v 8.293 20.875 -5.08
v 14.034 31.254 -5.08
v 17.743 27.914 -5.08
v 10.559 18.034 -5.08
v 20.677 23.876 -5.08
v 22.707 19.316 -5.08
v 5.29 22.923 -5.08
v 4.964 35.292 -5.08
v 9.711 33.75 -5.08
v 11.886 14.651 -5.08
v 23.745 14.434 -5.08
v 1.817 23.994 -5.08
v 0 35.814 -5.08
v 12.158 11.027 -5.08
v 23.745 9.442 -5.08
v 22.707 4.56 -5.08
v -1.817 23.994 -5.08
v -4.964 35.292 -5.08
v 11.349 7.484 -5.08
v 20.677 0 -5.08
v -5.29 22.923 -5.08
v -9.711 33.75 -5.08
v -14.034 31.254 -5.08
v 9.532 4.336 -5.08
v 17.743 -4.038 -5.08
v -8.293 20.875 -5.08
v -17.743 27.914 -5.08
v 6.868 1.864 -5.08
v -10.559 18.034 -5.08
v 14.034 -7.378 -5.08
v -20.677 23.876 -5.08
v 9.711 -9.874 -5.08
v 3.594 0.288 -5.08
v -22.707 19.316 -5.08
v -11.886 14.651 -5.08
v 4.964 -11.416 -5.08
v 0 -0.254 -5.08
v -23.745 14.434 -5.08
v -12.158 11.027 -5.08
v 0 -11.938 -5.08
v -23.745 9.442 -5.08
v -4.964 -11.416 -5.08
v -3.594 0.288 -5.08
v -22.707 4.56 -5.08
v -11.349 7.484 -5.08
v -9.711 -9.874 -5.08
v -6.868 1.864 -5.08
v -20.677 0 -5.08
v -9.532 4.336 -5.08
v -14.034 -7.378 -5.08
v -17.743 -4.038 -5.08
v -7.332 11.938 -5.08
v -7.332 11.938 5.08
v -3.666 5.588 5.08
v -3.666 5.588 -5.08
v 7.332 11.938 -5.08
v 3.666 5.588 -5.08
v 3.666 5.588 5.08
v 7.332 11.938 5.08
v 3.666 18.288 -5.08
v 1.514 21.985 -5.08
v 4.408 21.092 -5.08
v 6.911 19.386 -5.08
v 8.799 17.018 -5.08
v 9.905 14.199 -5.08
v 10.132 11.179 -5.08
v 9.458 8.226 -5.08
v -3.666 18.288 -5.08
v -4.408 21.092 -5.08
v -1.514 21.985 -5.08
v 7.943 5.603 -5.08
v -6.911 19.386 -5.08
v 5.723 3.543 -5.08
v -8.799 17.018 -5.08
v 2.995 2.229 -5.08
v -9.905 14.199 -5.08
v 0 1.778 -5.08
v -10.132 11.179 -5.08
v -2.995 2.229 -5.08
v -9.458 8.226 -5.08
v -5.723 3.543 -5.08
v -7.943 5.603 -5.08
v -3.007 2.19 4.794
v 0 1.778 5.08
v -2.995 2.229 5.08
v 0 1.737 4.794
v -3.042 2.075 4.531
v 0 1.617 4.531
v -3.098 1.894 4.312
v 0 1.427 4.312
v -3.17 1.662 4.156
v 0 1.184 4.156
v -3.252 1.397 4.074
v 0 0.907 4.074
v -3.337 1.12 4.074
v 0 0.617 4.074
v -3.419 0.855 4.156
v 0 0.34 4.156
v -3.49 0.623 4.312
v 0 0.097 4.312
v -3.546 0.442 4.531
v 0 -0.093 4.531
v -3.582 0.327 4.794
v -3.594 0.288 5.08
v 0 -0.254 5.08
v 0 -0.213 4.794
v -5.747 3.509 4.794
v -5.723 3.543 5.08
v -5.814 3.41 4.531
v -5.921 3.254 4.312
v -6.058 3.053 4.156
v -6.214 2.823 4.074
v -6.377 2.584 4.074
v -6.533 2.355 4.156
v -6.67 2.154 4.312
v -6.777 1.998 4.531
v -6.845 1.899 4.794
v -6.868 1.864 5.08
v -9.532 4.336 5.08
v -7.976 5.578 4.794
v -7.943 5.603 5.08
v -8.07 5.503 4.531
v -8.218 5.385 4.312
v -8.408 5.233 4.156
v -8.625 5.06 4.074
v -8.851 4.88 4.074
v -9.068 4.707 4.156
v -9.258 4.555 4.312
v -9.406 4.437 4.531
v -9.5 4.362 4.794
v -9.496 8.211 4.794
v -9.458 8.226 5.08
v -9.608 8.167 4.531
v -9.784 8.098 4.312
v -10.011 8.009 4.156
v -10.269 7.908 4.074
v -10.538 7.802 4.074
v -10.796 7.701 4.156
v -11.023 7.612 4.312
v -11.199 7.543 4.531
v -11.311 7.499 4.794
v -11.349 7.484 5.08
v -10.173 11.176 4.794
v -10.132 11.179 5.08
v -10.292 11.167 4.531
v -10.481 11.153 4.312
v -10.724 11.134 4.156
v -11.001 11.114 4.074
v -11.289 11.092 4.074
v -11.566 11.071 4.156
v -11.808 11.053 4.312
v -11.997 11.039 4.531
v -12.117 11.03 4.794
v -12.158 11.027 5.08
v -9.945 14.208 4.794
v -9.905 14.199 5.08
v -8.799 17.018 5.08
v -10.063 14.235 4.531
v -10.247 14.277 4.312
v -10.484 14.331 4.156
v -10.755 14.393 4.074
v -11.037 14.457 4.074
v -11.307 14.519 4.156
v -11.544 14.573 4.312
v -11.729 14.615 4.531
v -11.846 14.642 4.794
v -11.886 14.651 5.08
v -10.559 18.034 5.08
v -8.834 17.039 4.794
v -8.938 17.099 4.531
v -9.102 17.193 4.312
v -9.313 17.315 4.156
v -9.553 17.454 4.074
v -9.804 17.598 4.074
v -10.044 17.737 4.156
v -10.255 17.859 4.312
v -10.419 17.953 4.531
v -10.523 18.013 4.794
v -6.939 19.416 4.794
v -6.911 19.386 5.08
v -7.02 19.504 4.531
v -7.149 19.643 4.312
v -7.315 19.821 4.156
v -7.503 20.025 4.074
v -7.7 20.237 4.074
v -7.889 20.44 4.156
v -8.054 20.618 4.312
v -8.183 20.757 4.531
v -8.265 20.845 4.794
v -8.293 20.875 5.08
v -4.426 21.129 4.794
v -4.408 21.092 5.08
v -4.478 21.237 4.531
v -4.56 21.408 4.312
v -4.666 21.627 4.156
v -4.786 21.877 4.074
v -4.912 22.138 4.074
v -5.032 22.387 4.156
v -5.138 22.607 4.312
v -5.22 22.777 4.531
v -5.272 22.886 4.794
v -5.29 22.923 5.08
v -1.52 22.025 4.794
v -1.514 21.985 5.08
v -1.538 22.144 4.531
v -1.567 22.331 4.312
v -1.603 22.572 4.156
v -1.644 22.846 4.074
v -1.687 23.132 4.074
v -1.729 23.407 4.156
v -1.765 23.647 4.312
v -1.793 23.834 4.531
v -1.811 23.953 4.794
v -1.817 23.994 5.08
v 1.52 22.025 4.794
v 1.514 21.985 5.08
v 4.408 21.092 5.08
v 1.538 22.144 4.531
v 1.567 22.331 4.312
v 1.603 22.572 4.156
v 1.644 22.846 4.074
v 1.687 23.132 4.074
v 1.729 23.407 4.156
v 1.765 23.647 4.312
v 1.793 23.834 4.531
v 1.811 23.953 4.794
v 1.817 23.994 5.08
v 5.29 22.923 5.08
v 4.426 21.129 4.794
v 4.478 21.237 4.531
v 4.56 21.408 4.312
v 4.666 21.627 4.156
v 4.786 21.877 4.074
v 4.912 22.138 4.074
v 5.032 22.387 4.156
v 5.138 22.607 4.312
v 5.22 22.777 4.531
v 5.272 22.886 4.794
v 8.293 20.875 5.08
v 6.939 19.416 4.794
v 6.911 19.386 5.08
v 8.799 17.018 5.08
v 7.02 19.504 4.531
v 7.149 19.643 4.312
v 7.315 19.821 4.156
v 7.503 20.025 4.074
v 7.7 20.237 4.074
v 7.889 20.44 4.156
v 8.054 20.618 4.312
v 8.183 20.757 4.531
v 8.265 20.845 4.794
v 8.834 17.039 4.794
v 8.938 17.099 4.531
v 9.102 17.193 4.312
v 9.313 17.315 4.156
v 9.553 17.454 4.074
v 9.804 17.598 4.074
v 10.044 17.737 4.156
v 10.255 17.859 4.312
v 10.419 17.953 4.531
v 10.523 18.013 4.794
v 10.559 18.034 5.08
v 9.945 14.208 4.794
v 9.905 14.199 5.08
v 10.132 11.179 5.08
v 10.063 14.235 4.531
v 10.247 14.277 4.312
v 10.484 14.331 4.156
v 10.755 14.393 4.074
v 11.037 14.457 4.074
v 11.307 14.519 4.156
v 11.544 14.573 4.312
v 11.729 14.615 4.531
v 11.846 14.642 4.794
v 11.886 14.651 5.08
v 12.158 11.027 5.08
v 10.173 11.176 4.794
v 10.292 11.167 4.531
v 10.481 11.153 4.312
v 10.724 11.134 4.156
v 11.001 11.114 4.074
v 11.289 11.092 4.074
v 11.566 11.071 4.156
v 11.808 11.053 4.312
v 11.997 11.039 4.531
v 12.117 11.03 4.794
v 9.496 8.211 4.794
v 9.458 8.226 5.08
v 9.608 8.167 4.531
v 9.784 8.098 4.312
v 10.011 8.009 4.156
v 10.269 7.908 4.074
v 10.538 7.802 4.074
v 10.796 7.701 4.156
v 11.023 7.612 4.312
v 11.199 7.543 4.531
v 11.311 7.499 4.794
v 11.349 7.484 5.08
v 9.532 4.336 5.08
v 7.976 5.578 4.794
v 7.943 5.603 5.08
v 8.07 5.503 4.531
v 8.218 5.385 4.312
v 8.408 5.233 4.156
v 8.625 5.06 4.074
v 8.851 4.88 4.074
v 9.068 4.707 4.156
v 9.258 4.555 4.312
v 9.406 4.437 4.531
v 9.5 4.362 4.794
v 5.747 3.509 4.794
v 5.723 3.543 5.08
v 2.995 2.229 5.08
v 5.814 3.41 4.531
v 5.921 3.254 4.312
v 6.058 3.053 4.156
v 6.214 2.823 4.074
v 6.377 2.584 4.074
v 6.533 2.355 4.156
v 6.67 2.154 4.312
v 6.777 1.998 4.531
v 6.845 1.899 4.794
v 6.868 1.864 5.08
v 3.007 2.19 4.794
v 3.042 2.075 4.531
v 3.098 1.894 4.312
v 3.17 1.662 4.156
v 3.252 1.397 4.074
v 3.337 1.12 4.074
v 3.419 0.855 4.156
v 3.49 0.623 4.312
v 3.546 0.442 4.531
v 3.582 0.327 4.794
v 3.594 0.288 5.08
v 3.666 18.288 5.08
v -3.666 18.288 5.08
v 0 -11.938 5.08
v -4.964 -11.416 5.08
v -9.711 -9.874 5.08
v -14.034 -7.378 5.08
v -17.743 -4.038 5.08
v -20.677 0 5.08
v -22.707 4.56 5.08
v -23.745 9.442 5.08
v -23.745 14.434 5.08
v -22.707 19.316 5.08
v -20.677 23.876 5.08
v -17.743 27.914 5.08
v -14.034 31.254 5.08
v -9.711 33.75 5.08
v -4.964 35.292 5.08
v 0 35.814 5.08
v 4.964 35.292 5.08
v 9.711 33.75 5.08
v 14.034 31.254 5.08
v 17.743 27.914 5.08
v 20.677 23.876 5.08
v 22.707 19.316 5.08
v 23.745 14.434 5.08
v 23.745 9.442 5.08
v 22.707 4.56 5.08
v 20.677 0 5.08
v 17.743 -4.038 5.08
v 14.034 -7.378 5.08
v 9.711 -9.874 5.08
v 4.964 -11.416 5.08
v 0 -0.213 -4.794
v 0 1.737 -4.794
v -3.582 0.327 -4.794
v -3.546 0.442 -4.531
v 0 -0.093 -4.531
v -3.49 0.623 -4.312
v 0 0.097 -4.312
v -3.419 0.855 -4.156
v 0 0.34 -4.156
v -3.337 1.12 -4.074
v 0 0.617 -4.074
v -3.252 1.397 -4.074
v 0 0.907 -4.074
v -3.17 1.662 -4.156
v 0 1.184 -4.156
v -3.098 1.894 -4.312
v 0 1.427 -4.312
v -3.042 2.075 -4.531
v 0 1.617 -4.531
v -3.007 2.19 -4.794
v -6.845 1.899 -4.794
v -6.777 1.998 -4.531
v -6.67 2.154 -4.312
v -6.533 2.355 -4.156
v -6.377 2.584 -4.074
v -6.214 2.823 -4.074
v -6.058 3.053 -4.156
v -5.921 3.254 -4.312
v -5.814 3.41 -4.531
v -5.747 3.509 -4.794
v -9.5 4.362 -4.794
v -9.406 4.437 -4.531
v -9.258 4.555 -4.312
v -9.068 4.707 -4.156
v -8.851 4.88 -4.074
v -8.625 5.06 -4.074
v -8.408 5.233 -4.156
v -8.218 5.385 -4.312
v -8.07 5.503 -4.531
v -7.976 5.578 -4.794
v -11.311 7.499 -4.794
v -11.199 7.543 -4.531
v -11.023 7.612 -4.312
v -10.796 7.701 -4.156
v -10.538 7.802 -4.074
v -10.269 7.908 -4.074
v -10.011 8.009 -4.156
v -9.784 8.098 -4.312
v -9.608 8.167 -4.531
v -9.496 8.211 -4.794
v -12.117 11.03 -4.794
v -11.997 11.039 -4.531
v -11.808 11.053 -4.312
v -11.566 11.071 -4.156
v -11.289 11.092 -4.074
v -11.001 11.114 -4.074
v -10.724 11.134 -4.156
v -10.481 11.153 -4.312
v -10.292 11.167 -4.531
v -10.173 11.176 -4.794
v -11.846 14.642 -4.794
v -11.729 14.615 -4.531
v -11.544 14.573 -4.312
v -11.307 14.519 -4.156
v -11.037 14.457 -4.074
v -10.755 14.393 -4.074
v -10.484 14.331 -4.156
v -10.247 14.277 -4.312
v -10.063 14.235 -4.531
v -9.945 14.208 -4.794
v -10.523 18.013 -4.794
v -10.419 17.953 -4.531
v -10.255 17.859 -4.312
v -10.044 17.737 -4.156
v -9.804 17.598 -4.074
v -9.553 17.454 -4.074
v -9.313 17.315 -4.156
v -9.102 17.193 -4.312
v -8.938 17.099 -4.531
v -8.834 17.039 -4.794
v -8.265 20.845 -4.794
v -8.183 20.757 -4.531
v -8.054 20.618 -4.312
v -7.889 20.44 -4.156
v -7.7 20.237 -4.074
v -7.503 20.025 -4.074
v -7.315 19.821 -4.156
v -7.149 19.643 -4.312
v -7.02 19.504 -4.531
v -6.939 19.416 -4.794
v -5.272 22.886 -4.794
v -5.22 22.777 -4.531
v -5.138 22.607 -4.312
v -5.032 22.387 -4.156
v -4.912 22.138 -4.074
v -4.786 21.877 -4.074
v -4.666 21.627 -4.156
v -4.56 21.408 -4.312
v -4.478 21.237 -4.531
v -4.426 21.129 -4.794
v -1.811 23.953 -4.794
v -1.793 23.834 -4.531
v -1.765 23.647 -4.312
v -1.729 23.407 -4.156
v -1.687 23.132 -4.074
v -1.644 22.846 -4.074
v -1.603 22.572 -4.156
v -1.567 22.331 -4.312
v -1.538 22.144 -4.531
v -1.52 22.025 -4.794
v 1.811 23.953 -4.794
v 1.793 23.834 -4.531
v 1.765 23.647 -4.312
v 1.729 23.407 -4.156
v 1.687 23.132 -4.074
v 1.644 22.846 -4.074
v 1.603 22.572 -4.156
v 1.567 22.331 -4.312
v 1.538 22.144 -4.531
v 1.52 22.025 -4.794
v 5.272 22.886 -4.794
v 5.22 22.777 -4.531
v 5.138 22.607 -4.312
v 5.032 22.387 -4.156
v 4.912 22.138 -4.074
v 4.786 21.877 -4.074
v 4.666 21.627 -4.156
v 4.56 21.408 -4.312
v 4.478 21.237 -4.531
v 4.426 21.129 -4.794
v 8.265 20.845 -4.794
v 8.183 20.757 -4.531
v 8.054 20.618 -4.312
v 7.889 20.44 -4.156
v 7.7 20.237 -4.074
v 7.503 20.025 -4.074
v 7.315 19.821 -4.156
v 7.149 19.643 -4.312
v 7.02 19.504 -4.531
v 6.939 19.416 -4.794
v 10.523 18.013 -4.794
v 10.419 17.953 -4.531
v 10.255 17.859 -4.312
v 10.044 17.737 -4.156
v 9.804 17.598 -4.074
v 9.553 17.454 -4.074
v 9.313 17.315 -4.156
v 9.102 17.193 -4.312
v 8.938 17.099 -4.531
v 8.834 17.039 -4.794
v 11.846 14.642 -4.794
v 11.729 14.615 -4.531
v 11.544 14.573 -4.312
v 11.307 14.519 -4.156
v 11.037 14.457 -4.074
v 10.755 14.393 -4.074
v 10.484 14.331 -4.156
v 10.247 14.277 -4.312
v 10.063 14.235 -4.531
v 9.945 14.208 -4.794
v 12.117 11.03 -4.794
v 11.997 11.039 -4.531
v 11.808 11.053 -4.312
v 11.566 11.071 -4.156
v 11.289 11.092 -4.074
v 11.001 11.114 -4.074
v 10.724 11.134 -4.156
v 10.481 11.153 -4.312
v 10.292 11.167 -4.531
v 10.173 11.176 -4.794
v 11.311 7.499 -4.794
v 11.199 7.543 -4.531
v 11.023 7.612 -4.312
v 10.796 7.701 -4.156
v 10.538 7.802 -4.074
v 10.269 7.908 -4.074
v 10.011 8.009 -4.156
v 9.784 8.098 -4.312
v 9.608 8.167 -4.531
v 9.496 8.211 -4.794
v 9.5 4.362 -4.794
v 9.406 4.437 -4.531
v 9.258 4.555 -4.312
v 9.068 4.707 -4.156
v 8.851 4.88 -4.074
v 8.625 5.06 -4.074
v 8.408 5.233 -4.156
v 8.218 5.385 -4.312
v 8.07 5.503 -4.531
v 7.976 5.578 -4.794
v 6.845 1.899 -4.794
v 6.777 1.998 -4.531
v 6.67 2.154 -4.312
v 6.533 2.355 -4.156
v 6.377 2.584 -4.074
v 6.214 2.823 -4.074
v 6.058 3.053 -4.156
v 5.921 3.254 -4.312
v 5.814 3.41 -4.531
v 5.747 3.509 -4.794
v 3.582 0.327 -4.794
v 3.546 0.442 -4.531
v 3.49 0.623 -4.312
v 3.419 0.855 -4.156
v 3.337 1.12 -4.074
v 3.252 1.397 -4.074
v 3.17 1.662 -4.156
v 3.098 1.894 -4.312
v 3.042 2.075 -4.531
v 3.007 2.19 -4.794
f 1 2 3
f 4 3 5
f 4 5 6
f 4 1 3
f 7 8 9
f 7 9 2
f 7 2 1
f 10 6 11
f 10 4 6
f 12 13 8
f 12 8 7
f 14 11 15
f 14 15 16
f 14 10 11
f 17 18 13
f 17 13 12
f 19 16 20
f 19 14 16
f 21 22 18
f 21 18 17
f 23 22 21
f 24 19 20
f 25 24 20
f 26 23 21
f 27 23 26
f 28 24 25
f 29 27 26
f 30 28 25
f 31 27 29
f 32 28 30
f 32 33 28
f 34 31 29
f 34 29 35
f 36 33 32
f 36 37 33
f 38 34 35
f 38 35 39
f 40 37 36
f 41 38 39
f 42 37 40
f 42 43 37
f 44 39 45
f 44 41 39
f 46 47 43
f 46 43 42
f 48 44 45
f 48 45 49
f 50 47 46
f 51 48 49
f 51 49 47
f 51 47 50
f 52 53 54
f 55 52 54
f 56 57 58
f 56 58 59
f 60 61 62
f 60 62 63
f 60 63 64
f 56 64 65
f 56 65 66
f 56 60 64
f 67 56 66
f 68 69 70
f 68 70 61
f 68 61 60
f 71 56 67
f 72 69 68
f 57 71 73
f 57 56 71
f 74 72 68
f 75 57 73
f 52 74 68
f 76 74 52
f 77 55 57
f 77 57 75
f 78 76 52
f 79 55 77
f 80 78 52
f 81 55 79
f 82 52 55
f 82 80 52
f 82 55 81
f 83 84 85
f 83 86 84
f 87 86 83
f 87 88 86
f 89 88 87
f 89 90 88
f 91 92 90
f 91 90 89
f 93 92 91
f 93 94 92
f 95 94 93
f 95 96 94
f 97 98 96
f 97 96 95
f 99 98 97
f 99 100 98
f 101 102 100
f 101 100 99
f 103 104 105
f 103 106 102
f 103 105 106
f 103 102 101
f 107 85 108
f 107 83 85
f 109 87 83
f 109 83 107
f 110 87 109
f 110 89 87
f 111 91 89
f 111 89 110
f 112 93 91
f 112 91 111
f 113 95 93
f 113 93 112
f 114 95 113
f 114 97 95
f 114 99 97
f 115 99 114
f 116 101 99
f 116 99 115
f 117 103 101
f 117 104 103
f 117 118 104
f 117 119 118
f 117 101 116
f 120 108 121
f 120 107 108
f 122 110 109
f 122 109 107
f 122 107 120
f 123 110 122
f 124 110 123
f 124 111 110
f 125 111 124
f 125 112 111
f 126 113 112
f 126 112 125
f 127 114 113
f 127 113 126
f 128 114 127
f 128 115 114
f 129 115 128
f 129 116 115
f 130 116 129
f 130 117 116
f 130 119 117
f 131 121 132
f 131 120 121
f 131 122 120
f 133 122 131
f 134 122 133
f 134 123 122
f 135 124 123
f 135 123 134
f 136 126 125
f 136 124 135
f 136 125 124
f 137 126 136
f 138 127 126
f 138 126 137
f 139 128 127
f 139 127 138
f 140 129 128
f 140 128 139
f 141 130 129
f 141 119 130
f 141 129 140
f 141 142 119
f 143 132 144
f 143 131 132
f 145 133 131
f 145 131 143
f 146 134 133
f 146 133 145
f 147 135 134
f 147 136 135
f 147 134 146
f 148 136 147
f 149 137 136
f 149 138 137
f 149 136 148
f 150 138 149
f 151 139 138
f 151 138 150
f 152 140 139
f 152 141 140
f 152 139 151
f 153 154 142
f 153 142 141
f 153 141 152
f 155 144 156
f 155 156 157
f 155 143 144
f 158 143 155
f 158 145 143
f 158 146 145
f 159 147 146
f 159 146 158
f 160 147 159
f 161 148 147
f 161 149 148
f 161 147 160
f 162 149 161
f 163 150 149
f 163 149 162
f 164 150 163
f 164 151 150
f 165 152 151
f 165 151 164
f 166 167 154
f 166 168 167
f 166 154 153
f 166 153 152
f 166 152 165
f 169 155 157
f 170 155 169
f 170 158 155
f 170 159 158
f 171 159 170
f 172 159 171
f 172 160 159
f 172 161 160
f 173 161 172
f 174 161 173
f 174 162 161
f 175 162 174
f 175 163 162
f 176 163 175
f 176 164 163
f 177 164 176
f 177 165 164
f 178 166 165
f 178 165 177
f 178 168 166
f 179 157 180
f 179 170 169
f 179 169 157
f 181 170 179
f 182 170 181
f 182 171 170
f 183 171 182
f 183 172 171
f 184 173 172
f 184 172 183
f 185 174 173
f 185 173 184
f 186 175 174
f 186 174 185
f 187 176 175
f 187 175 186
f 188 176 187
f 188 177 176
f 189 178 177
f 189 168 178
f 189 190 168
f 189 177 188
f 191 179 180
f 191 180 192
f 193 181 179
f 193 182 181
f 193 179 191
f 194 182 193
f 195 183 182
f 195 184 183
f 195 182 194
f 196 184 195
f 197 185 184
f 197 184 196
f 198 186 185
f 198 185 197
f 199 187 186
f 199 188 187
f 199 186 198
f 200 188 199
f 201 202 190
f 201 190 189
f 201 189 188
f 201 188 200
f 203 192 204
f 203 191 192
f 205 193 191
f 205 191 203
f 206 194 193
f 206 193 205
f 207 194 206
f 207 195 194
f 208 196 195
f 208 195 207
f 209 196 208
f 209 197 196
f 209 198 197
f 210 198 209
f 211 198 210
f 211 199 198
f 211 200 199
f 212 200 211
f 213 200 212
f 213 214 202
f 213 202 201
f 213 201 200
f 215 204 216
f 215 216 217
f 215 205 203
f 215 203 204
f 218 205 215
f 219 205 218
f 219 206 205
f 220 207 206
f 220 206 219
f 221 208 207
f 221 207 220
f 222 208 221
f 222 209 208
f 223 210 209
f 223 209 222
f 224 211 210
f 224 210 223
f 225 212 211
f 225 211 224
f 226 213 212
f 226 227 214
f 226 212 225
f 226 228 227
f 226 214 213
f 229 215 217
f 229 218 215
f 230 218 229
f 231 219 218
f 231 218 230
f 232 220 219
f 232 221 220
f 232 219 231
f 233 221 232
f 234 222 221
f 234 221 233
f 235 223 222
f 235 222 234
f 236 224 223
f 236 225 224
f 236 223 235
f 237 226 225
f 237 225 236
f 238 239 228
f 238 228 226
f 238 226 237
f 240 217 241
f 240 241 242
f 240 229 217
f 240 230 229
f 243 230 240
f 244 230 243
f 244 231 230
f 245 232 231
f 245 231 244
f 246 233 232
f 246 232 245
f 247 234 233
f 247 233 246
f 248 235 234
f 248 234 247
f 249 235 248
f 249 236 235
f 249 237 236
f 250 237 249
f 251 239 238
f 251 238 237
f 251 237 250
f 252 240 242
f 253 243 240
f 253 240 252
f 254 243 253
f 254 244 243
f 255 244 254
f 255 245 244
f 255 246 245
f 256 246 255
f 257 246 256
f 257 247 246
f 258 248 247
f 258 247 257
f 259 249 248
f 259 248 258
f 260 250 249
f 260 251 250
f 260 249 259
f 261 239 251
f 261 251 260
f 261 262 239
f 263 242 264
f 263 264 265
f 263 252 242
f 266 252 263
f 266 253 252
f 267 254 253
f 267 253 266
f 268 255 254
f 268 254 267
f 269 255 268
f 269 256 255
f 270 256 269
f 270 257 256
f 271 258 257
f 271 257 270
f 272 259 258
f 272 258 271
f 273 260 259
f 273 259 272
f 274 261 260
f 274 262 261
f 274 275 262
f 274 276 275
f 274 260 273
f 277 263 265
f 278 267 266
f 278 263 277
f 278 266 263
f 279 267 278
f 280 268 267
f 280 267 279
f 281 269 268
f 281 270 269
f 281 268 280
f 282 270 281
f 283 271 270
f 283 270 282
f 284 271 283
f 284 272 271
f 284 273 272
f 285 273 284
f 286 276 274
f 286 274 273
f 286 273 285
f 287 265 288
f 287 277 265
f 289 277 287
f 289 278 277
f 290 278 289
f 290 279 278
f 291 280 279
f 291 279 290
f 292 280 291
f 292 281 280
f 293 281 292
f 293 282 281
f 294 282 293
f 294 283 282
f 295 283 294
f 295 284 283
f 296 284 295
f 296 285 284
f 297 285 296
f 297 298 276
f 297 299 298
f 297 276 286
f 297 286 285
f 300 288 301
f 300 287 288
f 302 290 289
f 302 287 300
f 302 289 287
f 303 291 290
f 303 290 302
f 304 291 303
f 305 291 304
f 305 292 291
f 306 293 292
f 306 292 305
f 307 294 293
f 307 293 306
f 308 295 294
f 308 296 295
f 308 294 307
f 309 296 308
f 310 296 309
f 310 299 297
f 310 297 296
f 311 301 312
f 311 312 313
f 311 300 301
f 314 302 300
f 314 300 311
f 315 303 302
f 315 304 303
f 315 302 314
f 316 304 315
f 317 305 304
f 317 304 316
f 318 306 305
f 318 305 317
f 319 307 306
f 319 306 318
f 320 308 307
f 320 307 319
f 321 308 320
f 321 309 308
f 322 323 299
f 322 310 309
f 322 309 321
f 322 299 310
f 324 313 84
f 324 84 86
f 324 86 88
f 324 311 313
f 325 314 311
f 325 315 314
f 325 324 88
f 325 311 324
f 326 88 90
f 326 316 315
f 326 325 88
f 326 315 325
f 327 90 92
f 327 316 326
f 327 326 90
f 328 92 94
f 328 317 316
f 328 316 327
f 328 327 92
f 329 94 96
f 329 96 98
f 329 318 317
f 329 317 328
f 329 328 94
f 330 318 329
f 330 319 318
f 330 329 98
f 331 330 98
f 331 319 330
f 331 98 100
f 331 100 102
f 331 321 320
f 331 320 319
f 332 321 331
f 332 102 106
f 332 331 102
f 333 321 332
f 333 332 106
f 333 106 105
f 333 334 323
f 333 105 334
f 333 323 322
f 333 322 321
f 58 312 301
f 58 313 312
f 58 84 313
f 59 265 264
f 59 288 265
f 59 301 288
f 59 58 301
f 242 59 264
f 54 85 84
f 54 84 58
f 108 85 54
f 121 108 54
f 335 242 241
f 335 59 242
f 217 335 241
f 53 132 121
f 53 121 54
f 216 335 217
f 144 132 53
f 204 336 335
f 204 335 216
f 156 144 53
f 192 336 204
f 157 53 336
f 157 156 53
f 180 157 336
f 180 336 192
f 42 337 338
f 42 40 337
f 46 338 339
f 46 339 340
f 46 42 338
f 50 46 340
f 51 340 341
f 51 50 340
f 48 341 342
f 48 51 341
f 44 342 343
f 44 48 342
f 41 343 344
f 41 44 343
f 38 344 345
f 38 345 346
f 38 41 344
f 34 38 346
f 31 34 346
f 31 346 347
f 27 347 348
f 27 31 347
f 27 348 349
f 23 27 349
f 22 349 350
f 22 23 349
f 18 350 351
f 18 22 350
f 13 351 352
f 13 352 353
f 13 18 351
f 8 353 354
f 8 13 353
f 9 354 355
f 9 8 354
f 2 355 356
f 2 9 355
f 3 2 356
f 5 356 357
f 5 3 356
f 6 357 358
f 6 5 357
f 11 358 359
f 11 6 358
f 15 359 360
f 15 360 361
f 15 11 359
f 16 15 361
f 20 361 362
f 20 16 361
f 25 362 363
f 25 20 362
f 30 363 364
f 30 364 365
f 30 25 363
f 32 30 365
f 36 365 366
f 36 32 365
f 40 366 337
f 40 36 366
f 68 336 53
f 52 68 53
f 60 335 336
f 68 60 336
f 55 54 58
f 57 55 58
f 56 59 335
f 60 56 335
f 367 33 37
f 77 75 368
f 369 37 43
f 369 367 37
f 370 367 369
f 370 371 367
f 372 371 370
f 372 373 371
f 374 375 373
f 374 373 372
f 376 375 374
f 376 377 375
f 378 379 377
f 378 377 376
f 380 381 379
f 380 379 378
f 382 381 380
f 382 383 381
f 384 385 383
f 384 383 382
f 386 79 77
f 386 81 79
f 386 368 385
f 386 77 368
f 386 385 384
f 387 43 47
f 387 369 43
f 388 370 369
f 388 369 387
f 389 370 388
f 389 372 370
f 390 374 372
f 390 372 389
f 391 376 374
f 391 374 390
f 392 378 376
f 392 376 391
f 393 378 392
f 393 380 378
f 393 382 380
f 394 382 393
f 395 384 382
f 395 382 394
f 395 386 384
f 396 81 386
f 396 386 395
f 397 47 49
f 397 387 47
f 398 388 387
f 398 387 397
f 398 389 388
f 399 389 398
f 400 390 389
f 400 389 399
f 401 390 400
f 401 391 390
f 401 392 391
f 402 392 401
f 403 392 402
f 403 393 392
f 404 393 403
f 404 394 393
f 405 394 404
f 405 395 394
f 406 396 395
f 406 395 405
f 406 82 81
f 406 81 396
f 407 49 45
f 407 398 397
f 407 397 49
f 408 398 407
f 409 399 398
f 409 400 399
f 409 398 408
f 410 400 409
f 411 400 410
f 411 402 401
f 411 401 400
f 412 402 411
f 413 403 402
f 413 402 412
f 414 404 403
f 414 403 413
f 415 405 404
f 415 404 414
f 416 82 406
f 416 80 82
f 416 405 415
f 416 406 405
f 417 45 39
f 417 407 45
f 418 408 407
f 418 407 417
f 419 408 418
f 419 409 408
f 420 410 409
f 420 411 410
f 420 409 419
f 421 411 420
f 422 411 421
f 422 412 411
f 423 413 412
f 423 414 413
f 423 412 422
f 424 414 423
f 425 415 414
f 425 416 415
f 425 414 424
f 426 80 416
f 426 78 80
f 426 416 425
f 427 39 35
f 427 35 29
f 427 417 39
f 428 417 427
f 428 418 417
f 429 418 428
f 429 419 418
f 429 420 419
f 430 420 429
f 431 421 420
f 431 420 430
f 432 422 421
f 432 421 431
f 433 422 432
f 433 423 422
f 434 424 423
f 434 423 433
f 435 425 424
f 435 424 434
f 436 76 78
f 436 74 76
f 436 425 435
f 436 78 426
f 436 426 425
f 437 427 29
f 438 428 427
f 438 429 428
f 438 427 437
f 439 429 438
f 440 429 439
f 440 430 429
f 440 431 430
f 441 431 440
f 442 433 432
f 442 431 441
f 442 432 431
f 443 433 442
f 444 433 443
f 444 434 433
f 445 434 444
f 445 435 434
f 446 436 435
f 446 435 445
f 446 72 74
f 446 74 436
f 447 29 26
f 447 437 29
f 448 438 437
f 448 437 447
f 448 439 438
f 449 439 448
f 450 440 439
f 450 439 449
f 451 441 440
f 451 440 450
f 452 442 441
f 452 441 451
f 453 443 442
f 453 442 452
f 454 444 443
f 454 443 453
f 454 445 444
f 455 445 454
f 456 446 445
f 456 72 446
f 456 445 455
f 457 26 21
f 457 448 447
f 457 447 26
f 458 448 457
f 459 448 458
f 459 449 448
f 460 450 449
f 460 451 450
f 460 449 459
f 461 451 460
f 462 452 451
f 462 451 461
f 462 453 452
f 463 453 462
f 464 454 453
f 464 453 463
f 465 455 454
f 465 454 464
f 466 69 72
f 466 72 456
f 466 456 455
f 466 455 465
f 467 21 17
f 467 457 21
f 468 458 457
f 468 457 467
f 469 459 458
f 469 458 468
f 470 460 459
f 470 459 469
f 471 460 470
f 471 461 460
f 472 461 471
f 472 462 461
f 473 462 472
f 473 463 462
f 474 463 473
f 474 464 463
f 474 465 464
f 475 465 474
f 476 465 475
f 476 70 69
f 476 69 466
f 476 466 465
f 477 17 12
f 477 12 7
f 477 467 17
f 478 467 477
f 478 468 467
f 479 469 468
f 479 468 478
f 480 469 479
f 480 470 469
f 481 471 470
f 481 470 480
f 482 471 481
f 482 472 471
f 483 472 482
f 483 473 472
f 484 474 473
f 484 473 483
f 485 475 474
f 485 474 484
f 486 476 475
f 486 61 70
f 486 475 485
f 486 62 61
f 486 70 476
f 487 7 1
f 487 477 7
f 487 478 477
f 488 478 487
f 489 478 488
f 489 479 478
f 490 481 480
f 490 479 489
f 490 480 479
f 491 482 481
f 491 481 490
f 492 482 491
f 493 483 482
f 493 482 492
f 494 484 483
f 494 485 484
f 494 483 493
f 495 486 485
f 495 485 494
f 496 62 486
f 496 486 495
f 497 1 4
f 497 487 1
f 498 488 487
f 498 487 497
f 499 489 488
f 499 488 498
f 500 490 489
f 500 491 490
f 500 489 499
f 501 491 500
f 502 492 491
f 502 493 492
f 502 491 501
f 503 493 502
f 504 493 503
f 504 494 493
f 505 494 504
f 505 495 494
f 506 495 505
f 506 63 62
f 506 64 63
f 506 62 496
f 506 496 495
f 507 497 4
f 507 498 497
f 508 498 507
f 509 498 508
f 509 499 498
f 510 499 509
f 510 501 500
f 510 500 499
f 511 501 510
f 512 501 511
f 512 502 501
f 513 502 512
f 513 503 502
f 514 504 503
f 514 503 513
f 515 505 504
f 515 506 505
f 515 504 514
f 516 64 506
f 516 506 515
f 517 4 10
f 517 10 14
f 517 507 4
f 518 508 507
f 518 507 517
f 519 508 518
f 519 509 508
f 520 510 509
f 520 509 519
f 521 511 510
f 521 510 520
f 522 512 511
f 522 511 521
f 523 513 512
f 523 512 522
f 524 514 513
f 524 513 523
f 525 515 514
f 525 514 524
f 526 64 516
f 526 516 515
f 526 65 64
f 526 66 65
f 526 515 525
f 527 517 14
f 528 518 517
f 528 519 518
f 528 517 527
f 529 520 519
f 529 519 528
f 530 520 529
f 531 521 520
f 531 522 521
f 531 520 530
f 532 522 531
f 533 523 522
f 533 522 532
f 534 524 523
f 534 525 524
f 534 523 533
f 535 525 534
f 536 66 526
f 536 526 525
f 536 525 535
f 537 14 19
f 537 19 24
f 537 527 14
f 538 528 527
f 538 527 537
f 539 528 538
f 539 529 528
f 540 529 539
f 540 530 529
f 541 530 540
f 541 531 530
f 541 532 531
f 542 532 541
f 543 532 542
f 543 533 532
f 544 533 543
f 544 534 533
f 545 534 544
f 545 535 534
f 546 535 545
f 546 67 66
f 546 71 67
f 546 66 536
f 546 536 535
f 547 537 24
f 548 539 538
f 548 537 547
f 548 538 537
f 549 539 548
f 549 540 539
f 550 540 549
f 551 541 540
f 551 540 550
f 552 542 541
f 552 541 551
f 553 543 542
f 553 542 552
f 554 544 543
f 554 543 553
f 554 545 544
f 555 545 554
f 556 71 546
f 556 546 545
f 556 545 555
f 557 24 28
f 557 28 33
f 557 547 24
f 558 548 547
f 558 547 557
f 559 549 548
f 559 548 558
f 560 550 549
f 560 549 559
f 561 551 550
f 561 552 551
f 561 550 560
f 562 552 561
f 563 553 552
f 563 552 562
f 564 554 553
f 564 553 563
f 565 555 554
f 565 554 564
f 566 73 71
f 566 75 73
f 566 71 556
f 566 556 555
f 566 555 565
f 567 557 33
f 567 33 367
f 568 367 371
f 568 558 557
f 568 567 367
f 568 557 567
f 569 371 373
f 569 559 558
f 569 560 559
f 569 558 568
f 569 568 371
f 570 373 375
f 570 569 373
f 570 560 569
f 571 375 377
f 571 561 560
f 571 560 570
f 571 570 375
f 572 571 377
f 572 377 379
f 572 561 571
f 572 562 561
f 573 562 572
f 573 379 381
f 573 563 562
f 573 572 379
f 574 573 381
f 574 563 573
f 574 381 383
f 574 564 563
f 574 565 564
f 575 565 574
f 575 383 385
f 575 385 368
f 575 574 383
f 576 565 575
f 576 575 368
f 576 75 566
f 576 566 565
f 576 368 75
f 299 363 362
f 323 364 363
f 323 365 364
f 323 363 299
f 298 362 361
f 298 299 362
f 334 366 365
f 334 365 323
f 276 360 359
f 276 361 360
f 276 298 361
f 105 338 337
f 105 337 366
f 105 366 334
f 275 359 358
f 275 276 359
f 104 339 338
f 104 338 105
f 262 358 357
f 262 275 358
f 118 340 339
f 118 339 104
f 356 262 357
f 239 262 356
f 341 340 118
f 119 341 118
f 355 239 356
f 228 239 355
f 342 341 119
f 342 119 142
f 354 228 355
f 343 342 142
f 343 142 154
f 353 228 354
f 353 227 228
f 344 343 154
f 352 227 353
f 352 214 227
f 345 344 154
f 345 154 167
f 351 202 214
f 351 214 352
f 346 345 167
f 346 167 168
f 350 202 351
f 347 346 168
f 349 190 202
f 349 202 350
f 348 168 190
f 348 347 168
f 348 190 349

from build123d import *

# Parameters (mm, degrees)
CUT_EXTRUDE1_DEPTH = 10.16


with BuildPart() as part:
    # Sketch1 → Revolve1 (revolve)
    with BuildSketch(Plane(origin=(0, 0, 0), x_dir=(0, 0, -1), z_dir=(1, 0, 0))):
        with BuildLine():
            Line((-5.08, -11.938), (5.08, -11.938))
            Line((5.08, -11.938), (5.08, -0.254))
            ThreePointArc((5.08, -0.254), (4.064, 0.762), (5.08, 1.778))
            Line((5.08, 1.778), (5.08, 11.938))
            Line((5.08, 11.938), (-5.08, 11.938))
            Line((-5.08, 11.938), (-5.08, 1.778))
            ThreePointArc((-5.08, 1.778), (-4.064, 0.762), (-5.08, -0.254))
            Line((-5.08, -0.254), (-5.08, -11.938))
        make_face()
    revolve(axis=Axis((0, 11.938, 5.08), (0, 0, -1)))

    # Sketch2 → Cut-Extrude1 (cut)
    with BuildSketch(Plane.XY.offset(5.08)):
        Polygon((7.332348419, 11.938), (3.666174209, 18.288), (-3.666174209, 18.288), (-7.332348419, 11.938), (-3.666174209, 5.588), (3.666174209, 5.588), align=None)
    extrude(amount=-CUT_EXTRUDE1_DEPTH, mode=Mode.SUBTRACT)


solid = part.part
